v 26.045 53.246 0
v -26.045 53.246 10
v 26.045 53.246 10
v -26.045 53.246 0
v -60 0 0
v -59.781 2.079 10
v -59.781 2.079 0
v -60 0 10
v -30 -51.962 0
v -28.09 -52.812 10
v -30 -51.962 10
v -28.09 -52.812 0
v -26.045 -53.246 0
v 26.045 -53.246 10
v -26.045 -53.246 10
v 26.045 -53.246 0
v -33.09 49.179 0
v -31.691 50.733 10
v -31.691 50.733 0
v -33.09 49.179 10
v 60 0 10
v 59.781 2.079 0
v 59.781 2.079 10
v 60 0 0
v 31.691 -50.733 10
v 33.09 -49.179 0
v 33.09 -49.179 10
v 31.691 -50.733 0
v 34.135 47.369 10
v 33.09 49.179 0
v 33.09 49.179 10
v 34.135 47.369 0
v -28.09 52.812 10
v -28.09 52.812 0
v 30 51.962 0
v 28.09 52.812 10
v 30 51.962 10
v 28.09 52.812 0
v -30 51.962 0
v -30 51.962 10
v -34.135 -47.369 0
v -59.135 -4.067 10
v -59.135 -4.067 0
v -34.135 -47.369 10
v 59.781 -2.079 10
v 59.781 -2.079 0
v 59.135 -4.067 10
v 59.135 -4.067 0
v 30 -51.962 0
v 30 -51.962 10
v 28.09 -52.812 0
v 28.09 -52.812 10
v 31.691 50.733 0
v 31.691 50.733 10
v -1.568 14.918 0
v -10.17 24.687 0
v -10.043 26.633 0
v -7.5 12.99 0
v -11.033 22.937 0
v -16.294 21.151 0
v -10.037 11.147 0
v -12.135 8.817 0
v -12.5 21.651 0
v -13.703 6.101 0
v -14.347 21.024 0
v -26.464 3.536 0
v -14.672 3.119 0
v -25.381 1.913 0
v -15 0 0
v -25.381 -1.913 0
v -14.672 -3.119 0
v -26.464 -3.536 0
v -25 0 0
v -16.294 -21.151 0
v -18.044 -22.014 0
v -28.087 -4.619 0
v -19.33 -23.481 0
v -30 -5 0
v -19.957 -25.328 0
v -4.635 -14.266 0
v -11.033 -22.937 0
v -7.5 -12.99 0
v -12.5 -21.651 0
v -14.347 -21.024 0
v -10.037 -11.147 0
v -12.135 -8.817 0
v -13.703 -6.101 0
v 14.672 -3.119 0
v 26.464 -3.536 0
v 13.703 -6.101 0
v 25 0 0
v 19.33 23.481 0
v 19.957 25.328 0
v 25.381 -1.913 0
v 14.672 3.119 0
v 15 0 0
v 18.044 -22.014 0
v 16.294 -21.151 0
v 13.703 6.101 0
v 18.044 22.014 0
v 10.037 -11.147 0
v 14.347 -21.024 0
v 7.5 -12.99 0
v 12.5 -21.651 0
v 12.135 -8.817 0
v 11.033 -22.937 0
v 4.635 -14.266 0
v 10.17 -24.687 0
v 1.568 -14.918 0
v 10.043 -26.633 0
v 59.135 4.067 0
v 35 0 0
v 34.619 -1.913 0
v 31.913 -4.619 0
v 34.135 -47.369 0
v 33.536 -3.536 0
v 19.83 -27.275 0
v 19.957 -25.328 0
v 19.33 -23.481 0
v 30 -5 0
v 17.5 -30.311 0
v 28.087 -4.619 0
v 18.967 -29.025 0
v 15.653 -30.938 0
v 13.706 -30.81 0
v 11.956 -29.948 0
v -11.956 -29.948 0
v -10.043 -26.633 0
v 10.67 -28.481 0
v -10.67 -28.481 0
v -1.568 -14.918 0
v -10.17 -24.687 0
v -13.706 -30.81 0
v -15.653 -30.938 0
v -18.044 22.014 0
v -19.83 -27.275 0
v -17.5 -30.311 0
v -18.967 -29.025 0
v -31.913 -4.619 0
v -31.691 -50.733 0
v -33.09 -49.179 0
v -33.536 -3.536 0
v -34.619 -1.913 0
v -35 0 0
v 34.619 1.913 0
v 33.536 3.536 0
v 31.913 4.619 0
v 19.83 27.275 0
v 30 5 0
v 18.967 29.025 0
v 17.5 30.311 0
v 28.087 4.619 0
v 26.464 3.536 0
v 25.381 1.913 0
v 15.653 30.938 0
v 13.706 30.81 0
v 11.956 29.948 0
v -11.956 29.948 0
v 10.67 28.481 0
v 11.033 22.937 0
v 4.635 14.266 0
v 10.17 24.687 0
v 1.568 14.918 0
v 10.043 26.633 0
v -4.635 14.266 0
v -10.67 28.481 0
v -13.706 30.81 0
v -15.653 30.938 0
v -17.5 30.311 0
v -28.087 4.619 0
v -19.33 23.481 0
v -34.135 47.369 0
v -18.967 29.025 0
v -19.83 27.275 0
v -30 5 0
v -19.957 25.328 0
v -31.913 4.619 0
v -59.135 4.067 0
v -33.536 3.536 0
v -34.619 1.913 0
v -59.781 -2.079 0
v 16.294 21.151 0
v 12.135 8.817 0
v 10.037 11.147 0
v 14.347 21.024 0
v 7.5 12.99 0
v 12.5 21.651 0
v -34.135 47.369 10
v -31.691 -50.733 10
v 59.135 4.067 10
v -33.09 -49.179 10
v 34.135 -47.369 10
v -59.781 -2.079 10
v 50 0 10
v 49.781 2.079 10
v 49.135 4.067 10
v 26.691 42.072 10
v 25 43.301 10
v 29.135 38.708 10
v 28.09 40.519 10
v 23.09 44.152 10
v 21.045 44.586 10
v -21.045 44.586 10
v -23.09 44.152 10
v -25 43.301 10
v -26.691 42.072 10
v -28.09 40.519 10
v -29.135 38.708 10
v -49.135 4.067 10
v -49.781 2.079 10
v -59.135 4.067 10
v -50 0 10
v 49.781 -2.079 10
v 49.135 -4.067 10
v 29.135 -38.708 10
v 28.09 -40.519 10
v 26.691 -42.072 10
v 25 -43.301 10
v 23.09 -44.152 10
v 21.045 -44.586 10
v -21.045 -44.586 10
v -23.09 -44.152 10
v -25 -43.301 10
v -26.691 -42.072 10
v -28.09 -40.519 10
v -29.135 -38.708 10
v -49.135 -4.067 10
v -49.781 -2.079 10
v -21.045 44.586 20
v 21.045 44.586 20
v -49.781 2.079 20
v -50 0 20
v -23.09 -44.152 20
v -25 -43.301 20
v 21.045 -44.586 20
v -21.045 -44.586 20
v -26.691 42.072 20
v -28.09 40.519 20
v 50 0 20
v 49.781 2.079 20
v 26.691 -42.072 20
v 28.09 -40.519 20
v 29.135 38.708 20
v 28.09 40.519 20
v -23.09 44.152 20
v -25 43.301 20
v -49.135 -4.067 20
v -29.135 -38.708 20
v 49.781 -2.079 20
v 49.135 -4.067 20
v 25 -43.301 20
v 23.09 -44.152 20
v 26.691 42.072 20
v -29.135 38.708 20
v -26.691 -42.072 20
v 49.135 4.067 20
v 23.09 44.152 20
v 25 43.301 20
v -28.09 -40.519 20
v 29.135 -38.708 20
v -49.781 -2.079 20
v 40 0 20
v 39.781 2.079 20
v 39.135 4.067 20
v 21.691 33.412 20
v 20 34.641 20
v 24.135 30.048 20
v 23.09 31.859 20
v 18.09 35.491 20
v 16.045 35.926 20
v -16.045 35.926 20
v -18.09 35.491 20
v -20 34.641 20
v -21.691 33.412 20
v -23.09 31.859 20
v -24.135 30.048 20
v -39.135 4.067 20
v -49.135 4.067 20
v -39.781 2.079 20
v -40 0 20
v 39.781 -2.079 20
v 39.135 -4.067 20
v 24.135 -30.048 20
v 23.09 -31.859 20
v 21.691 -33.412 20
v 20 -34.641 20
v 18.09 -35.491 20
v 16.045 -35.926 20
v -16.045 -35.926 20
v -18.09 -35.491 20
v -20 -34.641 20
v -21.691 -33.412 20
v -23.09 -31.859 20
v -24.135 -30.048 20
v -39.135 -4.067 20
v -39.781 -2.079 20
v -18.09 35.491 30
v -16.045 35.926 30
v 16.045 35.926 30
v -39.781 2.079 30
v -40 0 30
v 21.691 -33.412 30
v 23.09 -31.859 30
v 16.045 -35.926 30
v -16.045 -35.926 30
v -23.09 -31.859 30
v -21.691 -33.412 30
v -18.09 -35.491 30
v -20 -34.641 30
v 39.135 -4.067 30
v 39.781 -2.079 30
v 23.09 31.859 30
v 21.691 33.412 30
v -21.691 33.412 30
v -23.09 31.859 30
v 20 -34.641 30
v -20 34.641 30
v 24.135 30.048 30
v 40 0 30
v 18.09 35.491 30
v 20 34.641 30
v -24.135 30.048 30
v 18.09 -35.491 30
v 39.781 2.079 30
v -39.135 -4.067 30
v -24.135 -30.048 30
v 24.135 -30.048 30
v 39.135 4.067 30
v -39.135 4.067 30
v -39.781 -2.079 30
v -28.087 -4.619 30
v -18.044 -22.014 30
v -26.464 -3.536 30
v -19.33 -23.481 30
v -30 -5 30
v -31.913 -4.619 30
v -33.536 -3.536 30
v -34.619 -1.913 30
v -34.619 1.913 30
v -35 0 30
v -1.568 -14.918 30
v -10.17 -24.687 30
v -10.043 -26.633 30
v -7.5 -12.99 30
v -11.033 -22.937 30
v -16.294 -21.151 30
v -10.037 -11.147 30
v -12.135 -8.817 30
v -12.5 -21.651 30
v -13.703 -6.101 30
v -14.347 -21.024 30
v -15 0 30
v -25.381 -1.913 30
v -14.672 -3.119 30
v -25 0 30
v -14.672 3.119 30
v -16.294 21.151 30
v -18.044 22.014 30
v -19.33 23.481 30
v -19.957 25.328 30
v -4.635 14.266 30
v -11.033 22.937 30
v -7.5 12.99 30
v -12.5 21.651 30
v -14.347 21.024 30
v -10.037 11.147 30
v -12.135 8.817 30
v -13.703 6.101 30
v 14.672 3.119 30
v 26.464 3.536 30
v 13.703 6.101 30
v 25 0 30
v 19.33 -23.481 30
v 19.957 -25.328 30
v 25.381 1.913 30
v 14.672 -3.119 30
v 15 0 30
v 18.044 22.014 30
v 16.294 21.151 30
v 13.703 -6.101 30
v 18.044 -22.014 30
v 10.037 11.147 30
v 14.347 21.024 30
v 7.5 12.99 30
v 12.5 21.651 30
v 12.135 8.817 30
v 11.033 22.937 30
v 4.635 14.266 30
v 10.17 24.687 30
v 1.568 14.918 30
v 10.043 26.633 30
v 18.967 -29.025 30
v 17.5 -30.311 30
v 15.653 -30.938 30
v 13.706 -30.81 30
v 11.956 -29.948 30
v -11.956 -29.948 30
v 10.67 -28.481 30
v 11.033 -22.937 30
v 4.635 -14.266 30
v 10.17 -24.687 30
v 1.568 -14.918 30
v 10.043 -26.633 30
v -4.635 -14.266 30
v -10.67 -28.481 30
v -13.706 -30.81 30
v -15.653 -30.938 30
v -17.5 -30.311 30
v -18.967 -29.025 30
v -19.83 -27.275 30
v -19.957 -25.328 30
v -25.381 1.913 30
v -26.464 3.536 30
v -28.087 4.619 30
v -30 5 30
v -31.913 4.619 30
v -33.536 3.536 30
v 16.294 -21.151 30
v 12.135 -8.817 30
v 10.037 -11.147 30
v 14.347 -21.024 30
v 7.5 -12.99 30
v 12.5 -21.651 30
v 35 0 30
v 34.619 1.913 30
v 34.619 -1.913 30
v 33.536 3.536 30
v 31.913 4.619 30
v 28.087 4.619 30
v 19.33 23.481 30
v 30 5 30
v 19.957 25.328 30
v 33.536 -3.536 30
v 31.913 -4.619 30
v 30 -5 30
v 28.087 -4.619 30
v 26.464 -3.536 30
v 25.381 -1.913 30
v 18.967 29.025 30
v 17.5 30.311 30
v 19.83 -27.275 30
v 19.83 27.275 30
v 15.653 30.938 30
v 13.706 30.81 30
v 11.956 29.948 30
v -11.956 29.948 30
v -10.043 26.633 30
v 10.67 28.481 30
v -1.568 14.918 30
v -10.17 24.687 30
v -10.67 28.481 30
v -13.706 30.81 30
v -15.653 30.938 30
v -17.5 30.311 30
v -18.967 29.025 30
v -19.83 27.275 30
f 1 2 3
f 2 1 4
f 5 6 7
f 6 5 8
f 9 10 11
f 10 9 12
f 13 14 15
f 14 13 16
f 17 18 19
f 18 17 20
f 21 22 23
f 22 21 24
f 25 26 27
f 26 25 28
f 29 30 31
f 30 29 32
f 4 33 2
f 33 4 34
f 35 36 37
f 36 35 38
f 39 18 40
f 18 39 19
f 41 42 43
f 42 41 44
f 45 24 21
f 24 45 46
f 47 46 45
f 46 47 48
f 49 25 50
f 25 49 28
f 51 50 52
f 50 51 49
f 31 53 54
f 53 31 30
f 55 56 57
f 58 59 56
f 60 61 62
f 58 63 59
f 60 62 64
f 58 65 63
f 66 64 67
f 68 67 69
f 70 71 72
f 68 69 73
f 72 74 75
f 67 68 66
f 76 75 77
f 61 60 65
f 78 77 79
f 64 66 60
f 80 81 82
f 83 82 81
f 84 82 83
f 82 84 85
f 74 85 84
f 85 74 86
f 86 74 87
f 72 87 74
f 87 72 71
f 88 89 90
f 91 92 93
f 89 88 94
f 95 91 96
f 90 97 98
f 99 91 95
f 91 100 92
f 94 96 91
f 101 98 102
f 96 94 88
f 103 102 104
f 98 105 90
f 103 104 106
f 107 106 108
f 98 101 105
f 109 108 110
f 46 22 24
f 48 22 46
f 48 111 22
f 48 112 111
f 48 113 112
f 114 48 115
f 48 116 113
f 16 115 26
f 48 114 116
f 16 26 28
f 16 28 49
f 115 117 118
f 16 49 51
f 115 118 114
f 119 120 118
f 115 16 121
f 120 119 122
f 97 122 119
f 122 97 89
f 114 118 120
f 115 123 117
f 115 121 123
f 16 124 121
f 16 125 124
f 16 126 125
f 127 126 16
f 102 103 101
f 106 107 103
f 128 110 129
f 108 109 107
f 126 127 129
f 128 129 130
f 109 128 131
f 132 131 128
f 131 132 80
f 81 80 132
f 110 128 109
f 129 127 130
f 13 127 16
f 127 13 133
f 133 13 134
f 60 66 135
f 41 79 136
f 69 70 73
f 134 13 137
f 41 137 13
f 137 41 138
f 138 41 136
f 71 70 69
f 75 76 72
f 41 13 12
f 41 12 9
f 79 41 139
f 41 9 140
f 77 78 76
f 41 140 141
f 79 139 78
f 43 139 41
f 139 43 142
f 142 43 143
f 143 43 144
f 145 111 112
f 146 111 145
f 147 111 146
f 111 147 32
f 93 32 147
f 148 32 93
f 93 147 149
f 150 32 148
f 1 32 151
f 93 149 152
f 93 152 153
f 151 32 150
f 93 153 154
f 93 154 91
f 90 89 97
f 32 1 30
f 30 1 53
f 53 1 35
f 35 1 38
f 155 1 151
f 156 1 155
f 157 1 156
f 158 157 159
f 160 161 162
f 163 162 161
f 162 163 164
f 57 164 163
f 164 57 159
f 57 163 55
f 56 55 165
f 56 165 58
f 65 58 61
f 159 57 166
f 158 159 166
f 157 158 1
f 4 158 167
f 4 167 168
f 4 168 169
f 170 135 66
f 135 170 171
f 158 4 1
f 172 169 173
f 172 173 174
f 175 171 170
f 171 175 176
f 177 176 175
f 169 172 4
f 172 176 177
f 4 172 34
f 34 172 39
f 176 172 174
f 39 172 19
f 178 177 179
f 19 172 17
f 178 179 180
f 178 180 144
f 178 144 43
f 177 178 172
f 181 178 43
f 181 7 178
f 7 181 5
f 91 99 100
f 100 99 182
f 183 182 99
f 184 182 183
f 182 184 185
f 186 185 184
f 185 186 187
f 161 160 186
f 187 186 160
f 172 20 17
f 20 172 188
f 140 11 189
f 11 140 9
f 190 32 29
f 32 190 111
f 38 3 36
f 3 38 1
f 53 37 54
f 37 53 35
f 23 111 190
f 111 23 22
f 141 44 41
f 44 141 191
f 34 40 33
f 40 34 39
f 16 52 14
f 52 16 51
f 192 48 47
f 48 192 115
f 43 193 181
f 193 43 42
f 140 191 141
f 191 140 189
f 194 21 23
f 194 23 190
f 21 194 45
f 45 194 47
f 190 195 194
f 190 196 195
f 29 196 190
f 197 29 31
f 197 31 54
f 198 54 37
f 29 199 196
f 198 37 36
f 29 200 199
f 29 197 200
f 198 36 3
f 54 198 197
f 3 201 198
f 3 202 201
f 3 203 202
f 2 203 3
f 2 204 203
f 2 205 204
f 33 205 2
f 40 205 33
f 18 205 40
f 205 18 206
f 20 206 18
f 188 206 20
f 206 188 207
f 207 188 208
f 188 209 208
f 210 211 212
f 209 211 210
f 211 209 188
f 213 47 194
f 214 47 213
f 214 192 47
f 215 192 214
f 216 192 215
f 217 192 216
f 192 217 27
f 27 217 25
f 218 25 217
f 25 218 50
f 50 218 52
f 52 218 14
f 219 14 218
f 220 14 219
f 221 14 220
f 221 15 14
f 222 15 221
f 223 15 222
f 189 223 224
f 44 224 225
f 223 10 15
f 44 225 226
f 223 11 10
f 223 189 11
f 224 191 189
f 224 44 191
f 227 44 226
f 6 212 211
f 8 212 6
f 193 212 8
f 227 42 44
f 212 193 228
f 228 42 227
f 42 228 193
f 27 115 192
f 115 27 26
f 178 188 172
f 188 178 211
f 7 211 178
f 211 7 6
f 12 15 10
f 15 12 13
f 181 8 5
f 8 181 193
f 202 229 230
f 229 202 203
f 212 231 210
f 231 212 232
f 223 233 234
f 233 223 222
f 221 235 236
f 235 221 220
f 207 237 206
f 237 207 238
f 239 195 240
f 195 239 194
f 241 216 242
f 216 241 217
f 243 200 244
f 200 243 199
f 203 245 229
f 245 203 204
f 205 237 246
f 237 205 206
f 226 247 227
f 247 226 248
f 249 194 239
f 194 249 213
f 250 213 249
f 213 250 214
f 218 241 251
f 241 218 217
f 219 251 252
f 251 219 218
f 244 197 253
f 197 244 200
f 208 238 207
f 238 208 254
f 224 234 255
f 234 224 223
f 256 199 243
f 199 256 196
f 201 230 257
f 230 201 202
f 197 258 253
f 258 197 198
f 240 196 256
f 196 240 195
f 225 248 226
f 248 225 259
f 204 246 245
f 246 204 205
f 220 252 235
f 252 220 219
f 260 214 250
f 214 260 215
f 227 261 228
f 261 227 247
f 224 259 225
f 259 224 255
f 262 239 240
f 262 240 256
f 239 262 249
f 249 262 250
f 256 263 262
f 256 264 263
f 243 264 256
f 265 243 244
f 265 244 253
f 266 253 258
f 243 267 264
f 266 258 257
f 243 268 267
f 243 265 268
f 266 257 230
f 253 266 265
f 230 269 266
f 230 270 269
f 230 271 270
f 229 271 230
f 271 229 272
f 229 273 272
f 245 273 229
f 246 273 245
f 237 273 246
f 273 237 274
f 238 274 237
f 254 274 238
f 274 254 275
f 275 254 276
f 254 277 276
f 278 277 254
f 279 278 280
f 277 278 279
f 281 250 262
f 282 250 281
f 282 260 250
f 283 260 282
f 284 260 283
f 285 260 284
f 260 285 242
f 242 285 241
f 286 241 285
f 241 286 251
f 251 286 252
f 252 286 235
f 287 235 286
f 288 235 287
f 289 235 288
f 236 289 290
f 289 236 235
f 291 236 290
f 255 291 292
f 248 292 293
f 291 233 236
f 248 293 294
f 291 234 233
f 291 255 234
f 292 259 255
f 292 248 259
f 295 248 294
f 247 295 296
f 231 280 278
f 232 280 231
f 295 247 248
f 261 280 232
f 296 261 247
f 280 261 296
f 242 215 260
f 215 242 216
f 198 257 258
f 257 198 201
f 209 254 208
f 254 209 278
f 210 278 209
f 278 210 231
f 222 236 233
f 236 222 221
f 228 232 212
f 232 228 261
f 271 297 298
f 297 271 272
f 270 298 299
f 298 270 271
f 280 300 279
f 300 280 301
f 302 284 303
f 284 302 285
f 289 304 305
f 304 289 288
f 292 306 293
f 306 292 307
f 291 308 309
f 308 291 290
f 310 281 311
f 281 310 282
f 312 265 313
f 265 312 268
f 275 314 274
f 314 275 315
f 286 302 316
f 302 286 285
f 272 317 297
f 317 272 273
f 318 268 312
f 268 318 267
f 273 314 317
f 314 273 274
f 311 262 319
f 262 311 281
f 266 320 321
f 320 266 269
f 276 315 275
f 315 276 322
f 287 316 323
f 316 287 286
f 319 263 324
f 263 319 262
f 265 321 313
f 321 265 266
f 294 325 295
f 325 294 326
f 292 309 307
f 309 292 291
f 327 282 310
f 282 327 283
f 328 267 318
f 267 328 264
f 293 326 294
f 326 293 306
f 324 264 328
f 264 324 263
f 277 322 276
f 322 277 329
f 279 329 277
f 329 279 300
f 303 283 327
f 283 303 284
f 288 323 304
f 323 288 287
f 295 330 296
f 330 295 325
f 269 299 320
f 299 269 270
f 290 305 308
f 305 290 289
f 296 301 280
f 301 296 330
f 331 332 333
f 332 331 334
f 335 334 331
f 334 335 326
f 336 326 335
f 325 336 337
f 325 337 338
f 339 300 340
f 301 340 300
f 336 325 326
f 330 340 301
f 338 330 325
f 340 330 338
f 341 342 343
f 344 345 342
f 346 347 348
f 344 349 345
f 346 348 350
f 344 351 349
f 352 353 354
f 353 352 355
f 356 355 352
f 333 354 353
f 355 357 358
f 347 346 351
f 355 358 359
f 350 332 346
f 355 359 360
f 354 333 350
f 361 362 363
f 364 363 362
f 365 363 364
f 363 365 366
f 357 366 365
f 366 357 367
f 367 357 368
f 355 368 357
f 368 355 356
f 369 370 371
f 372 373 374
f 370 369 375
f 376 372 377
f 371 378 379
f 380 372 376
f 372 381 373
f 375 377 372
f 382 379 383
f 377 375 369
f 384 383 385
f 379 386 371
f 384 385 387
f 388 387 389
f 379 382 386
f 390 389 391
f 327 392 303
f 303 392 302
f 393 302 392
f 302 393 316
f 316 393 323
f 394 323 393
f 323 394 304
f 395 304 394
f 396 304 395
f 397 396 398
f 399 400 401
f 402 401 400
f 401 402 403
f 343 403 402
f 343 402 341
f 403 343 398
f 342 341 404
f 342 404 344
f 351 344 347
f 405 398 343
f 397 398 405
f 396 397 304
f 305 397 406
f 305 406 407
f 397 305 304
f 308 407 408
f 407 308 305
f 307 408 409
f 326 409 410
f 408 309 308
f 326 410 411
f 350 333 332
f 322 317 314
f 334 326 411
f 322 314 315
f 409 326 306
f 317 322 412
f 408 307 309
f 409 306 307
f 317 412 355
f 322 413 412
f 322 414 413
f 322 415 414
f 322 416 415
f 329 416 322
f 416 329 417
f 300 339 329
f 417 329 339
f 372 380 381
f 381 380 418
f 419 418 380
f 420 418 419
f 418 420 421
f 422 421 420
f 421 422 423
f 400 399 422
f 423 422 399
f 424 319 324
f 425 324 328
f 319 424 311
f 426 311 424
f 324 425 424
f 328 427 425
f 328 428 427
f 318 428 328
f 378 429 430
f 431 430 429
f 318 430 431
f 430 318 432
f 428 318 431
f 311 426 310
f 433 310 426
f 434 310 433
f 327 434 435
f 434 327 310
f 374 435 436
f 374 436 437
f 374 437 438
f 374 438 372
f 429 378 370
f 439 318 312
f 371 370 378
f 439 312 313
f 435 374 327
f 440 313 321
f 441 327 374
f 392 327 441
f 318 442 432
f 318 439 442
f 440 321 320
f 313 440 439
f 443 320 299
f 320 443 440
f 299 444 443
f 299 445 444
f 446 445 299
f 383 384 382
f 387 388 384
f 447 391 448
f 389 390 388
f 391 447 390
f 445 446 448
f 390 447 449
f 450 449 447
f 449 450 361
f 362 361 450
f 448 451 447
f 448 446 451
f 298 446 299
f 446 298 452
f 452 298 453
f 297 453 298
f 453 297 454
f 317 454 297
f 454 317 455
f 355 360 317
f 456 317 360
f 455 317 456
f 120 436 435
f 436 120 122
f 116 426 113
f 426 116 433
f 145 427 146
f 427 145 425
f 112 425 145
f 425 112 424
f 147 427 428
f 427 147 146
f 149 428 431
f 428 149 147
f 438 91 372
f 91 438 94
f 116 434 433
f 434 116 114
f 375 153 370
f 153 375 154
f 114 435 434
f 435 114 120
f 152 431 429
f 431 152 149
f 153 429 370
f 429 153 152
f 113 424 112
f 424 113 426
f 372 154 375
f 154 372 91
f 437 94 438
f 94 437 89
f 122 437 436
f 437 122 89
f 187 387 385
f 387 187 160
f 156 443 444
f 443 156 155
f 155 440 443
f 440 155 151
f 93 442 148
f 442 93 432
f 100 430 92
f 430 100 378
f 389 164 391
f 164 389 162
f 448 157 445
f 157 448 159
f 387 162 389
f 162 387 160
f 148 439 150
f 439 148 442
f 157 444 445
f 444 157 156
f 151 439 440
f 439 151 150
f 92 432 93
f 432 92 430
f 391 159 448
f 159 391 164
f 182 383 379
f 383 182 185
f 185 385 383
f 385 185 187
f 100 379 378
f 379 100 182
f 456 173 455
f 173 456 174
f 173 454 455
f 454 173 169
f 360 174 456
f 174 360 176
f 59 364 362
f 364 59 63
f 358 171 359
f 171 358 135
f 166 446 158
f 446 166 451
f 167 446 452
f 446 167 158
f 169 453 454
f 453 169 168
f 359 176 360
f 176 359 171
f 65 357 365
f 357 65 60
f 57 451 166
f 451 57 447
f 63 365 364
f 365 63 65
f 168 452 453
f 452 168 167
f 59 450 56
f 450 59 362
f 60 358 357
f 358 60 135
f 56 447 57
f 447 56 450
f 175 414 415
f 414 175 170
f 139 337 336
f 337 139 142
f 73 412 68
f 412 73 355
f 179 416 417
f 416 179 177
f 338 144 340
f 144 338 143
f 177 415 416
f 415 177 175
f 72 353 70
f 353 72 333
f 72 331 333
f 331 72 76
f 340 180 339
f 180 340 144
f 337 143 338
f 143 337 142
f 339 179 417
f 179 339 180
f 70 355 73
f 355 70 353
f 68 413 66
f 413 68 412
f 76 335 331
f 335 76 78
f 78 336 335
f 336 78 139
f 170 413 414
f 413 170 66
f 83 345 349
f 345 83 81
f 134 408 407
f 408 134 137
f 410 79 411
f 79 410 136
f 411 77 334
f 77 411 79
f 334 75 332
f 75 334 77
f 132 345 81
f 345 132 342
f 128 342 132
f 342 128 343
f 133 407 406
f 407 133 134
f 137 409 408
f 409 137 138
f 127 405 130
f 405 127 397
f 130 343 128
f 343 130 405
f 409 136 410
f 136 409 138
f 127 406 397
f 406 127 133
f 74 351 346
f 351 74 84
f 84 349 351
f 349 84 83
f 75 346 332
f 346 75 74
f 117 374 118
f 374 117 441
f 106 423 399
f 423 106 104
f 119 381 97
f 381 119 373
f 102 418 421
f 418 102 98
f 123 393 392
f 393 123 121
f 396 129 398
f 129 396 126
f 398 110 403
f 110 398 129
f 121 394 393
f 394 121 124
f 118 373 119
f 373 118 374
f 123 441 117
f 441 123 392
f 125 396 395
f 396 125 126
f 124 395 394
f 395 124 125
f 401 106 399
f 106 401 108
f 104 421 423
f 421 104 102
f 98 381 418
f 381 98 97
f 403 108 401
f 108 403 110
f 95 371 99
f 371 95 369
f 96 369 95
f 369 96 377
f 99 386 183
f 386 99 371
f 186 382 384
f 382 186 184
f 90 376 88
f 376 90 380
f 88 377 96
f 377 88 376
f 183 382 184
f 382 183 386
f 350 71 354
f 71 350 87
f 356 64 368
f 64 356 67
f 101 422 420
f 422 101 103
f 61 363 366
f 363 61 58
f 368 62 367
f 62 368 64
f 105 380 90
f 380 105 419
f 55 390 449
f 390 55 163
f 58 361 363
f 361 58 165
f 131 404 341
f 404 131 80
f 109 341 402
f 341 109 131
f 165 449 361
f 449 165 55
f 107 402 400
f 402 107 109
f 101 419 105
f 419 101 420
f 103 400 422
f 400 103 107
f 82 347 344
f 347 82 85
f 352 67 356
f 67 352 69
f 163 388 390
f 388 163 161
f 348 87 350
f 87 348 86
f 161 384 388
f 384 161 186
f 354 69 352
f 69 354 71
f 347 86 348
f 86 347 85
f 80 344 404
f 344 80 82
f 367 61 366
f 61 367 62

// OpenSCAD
module pcd(n, d) {
    angle = 360/n;
    for (i=[0:n-1]) {
        rotate([0,0,i*angle]) translate([d/2,0,0]) children();
    }
}

module boss_on_pcd(n, pcd, r) {
    hull() {
        for (i=[0: n-1]) {
            pcd(n, pcd) circle(r=r);
        }
    }
}

module stepped_boss() {
    difference() {
        union() {
            linear_extrude(10) boss_on_pcd(6, 100, 10);
            linear_extrude(20) boss_on_pcd(6, 80, 10);
            linear_extrude(30) boss_on_pcd(6, 60, 10);
        }
        pcd(6, 60) cylinder(d=10, h=30.1);
        cylinder(d=30, h=30.1);
    }
}

module lin_ext_test() {
    linear_extrude(10) {
        difference() {
            boss_on_pcd(12, 100, 10);
            pcd(12, 100) circle(d=10);
        }
    }
}
  
module circ_test() {
    difference() {
        circle(d=100);
        translate([50, 0, 0]) square(100, center=true);
    }
}

stepped_boss();
//lin_ext_test();
//circ_test();
